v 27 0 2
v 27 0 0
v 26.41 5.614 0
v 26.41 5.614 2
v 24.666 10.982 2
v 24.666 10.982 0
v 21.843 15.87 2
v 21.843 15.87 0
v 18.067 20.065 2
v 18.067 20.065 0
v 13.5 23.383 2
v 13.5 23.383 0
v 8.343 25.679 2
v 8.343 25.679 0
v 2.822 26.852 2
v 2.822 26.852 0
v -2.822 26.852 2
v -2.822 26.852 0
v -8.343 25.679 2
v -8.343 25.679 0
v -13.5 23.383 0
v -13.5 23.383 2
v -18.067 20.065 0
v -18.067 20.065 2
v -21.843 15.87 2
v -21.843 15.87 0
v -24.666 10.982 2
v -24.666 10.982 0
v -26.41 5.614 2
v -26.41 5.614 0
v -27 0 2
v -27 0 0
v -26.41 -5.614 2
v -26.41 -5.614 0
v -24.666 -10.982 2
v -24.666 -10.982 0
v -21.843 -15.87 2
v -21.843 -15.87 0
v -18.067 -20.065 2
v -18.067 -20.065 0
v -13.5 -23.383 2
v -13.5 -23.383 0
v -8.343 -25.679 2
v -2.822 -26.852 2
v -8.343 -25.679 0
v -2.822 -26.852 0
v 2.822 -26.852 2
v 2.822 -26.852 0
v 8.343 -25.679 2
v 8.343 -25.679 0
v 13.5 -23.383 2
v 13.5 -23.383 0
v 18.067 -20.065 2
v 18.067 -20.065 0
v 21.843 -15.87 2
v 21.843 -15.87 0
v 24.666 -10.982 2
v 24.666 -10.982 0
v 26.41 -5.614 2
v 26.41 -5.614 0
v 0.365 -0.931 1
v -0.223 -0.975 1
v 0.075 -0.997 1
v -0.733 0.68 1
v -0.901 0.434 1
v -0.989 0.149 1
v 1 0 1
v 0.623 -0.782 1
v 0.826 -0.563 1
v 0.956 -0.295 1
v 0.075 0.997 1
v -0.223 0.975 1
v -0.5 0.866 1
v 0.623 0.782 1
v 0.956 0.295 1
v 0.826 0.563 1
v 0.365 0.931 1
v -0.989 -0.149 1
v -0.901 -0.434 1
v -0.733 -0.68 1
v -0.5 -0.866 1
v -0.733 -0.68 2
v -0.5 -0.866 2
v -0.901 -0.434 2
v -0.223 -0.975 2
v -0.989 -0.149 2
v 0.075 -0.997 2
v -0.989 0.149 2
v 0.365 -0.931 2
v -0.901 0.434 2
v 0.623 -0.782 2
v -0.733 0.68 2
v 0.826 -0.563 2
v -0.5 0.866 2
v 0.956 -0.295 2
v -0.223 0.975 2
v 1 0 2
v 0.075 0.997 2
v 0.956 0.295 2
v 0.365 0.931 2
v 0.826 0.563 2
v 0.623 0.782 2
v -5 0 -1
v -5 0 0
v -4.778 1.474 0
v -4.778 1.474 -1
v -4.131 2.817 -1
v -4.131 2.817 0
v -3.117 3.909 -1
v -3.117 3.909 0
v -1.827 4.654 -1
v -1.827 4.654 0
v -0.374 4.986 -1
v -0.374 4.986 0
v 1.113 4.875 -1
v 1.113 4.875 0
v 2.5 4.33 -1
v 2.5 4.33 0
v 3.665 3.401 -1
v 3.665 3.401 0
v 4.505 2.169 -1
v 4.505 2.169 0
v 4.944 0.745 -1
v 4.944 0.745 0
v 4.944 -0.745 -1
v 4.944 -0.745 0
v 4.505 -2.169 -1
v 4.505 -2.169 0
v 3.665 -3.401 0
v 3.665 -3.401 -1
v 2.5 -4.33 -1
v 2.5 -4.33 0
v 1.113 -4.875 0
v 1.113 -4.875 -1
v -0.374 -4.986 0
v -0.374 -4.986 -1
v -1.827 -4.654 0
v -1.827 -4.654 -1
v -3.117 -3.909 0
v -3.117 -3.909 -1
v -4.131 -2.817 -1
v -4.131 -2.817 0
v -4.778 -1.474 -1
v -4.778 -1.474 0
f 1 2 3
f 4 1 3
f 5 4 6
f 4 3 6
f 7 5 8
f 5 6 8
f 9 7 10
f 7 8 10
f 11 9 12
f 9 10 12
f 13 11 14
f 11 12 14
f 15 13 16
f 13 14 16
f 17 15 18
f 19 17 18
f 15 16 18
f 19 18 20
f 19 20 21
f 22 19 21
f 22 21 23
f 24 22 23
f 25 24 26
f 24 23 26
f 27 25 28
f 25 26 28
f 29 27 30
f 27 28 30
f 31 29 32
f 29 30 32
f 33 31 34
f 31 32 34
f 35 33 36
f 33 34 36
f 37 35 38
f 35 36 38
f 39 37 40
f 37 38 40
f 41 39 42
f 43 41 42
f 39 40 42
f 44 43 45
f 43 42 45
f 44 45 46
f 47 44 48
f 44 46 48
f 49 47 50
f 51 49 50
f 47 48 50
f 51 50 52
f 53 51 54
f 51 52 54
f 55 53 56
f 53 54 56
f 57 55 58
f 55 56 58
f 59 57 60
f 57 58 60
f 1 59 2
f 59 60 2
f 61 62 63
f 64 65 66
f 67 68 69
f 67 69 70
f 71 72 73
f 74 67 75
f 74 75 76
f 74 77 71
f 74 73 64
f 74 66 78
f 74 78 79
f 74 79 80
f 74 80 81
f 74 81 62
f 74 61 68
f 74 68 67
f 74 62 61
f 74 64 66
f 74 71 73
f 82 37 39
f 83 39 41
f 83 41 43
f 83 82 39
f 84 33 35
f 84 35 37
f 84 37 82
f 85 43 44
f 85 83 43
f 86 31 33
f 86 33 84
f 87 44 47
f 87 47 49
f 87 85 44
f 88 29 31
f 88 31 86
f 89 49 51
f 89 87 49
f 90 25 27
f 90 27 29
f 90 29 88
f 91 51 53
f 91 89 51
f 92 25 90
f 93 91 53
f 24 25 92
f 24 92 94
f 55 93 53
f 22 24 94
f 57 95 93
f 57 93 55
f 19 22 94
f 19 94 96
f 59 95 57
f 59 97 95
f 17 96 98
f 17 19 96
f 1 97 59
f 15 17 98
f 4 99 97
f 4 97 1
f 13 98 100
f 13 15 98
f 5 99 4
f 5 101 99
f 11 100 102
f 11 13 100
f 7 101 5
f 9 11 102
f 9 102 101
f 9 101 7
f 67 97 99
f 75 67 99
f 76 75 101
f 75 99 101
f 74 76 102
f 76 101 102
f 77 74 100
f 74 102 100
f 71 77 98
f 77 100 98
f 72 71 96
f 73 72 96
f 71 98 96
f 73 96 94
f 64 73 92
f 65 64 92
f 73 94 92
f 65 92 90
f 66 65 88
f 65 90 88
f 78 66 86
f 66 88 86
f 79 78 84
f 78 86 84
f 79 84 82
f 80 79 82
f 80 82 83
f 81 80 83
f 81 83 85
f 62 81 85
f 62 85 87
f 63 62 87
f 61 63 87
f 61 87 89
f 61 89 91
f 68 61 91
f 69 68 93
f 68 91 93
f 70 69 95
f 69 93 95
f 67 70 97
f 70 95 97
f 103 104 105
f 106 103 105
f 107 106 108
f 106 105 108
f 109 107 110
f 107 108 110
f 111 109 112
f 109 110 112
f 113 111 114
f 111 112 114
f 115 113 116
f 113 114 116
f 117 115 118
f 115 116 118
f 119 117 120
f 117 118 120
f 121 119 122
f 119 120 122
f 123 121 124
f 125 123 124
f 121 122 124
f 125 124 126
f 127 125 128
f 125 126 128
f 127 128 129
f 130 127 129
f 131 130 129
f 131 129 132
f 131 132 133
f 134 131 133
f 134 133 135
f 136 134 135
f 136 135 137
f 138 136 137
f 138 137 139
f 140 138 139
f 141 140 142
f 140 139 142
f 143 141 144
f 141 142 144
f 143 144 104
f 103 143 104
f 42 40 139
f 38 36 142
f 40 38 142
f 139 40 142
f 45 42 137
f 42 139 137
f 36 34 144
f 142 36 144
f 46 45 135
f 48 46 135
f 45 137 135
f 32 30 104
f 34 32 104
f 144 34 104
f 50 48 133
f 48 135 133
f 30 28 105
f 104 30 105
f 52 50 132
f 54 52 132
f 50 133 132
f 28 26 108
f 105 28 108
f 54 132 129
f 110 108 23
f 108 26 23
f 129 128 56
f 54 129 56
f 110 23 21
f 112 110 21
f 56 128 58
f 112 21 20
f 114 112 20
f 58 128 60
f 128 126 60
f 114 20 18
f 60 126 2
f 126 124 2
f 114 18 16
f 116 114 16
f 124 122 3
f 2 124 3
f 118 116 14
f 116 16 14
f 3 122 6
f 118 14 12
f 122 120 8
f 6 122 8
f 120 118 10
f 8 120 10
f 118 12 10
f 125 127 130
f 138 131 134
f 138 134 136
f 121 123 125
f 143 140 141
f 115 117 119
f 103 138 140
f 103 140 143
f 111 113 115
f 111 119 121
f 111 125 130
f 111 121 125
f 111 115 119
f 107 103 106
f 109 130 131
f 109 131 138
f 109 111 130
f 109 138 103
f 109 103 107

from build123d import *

# Parameters (mm, degrees)
ESBO_O1_R                = 27
RESSALTO_EXTRUS_O1_DEPTH = 2
ESBO_O3_R                = 5
RESSALTO_EXTRUS_O2_DEPTH = 1
ESBO_O4_R                = 1
CORTE_EXTRUS_O1_DEPTH    = 1


with BuildPart() as part:
    # Esboço1 → Ressalto-extrusão1 (new body)
    with BuildSketch(Plane.XY):
        Circle(ESBO_O1_R)
    extrude(amount=RESSALTO_EXTRUS_O1_DEPTH)

    # Esboço3 → Ressalto-extrusão2 (add)
    with BuildSketch(Plane(origin=(0, 0, 0), x_dir=(-1, 0, 0), z_dir=(0, 0, -1))):
        Circle(ESBO_O3_R)
    extrude(amount=RESSALTO_EXTRUS_O2_DEPTH)

    # Esboço4 → Corte-extrusão1 (cut)
    with BuildSketch(Plane.XY.offset(2)):
        Circle(ESBO_O4_R)
    extrude(amount=-CORTE_EXTRUS_O1_DEPTH, mode=Mode.SUBTRACT)


solid = part.part
